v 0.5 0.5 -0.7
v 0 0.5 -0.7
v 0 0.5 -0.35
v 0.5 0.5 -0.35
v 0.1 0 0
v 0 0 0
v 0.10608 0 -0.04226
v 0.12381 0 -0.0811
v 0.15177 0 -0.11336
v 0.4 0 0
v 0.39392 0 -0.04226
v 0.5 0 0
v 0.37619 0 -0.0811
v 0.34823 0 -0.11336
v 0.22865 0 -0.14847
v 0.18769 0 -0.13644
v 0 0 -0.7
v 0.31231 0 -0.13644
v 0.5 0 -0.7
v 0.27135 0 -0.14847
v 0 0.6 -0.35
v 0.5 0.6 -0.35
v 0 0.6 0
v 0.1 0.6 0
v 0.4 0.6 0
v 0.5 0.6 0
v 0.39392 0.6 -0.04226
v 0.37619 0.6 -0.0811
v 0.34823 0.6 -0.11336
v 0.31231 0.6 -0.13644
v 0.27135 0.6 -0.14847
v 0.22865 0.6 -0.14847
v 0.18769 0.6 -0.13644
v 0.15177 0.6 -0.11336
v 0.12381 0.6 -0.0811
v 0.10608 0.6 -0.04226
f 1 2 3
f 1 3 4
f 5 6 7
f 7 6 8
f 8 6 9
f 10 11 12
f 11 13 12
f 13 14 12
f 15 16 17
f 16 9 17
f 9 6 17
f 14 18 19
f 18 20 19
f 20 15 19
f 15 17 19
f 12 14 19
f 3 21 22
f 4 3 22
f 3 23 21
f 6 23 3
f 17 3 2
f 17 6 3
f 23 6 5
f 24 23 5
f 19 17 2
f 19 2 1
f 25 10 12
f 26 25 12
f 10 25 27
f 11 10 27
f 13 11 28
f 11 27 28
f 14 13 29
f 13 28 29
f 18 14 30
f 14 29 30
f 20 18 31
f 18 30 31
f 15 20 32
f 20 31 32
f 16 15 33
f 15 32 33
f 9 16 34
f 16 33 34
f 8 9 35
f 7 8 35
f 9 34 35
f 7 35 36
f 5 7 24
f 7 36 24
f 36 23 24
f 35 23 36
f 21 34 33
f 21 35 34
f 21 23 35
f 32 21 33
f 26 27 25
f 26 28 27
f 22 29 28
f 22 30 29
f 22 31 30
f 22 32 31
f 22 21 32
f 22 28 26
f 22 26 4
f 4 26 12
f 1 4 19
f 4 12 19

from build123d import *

# Parameters (mm, degrees)
SKETCH1_W           = 0.5
SKETCH1_H           = 0.7
BOSS_EXTRUDE1_DEPTH = 0.6
CUT_EXTRUDE1_REACH  = 2.6
SKETCH2_R           = 0.15
SKETCH3_W           = 0.5
SKETCH3_H           = 0.35
CUT_EXTRUDE2_DEPTH  = 0.1


with BuildPart() as part:
    # Sketch1 → Boss-Extrude1 (new body)
    with BuildSketch(Plane(origin=(0, 0, 0), x_dir=(1, 0, 0), z_dir=(0, 1, 0))):
        with Locations((0.25, 0.35)):
            Rectangle(SKETCH1_W, SKETCH1_H)
    extrude(amount=BOSS_EXTRUDE1_DEPTH)

    # Sketch2 → Cut-Extrude1 (cut, up to next)
    with BuildSketch(Plane(origin=(0, 0.6, 0), x_dir=(1, 0, 0), z_dir=(0, 1, 0)), mode=Mode.PRIVATE) as cut_extrude1_sk1:
        with Locations((0.25, 0)):
            Circle(SKETCH2_R)
    cut_extrude1_tool1 = extrude(cut_extrude1_sk1.sketch, amount=-CUT_EXTRUDE1_REACH, mode=Mode.PRIVATE) & part.part
    add(cut_extrude1_tool1.solids().sort_by_distance((0.25, 0.6, 0))[0], mode=Mode.SUBTRACT)

    # Sketch3 → Cut-Extrude2 (cut)
    with BuildSketch(Plane(origin=(0, 0.6, 0), x_dir=(1, 0, 0), z_dir=(0, 1, 0))):
        with Locations((0.25, 0.525)):
            Rectangle(SKETCH3_W, SKETCH3_H)
    extrude(amount=-CUT_EXTRUDE2_DEPTH, mode=Mode.SUBTRACT)


solid = part.part
